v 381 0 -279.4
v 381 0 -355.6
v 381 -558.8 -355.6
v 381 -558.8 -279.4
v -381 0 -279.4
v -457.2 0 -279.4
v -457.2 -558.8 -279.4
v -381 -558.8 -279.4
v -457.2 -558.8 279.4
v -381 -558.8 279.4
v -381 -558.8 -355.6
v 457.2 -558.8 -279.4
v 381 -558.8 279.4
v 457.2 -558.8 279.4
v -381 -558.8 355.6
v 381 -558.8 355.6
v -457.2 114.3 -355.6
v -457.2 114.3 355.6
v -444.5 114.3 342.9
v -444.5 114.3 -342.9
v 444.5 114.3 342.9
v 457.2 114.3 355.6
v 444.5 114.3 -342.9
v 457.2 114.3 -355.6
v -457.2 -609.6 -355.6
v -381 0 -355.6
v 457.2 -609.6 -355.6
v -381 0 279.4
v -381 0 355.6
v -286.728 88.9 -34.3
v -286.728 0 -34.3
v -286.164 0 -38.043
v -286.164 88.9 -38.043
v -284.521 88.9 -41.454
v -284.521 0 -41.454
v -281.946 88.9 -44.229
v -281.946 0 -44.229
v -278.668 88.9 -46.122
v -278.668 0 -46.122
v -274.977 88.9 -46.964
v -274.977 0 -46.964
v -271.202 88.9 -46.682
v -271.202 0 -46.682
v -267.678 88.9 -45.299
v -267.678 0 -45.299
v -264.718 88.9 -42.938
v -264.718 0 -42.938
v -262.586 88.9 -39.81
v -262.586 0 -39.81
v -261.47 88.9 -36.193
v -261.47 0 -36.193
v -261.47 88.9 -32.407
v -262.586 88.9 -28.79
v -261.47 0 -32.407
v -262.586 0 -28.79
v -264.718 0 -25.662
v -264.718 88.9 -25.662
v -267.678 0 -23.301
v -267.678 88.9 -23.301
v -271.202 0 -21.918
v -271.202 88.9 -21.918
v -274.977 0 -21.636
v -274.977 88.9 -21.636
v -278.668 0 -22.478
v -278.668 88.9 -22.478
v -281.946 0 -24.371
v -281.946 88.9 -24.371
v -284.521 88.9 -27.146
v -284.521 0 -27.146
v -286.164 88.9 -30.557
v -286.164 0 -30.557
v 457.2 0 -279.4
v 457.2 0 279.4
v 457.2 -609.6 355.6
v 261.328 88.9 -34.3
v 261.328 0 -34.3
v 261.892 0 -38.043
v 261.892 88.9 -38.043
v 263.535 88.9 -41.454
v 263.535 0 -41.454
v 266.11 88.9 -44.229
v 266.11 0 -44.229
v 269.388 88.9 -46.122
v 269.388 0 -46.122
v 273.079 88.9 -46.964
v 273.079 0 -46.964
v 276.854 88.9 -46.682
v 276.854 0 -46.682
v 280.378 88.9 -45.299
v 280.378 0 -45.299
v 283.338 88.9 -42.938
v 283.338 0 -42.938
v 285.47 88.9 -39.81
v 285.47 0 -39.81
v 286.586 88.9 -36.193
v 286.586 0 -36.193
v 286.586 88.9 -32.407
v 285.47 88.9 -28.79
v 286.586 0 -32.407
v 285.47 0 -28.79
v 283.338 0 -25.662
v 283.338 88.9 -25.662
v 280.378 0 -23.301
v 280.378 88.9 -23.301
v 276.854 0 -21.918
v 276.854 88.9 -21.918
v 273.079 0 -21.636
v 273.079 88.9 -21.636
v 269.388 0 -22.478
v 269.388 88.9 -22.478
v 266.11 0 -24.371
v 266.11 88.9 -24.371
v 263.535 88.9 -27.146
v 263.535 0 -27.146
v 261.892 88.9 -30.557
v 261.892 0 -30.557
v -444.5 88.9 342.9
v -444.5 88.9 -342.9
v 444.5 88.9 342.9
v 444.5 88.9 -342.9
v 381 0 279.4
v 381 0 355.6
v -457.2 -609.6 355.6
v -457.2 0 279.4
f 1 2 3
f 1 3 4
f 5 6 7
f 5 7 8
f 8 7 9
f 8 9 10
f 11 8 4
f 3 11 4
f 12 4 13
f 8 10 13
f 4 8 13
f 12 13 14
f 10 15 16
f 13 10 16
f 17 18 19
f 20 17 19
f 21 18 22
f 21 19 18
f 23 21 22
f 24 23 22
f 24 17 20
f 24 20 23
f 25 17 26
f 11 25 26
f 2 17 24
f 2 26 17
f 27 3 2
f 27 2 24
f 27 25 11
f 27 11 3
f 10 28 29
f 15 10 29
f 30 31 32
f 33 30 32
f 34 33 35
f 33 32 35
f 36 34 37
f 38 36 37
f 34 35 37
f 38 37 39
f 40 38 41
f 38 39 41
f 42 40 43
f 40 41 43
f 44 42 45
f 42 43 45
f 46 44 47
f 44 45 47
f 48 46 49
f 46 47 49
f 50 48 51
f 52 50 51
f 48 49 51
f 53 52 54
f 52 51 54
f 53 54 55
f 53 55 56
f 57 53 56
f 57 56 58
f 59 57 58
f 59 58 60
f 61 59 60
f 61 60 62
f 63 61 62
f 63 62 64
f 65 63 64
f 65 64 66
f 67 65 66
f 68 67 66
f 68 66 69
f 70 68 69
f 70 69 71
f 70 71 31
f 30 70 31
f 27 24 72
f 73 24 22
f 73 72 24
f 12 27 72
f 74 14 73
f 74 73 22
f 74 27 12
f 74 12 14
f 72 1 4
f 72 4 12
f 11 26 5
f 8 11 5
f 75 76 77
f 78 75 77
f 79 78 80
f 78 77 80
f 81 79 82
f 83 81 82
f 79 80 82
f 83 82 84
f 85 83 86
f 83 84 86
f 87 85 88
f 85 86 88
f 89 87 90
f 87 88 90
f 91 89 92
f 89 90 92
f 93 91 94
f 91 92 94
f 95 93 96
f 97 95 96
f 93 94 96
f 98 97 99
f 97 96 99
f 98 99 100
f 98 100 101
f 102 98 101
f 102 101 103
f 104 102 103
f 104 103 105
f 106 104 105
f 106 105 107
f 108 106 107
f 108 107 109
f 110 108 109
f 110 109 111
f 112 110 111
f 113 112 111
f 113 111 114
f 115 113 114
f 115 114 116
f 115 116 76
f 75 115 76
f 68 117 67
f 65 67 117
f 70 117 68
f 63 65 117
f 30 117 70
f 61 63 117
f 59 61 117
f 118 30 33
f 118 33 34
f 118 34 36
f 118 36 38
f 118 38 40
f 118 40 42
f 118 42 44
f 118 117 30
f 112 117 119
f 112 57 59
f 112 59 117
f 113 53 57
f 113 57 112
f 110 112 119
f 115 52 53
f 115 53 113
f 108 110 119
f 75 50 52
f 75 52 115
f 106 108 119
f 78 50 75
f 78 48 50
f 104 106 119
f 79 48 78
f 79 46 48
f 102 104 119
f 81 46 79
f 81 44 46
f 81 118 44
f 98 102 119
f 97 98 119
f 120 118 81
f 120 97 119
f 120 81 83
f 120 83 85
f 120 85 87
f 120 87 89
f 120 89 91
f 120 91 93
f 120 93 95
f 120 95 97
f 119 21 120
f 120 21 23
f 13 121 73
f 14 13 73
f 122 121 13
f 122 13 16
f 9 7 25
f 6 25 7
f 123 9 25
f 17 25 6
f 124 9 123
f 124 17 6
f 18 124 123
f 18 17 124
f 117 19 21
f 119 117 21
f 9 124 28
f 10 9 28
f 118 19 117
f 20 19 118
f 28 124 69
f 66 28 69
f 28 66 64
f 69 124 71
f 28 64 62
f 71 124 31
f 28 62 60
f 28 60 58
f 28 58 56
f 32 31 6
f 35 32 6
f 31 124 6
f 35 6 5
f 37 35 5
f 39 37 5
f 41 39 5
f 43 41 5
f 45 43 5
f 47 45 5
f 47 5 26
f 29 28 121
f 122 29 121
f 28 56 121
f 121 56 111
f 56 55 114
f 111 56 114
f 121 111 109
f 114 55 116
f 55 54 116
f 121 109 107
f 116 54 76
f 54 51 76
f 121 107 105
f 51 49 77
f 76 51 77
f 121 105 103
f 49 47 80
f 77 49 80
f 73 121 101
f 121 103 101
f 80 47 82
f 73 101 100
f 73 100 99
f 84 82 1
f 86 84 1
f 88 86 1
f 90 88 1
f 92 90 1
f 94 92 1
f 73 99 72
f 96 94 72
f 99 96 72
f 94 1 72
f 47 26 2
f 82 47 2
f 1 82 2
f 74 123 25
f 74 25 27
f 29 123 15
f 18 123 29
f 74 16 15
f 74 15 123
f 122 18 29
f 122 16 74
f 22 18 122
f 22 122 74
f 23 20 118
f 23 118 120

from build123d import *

# Parameters (mm, degrees)
SKETCH1_W                  = 914.4
SKETCH1_H                  = 711.2
BOSS_EXTRUDE1_DEPTH        = 114.3
SKETCH2_W                  = 889
SKETCH2_H                  = 685.8
CUT_EXTRUDE1_DEPTH         = 25.4
SKETCH3_W                  = 76.2
SKETCH3_H                  = 76.2
BOSS_EXTRUDE2_DEPTH        = 609.6
SKETCH4_W                  = 914.4
SKETCH4_H                  = 711.2
BOSS_EXTRUDE3_DEPTH        = 50.8
F_1_1_DIAMETER_HOLE1_D     = 25.4
F_1_1_DIAMETER_HOLE1_DEPTH = 88.9


with BuildPart() as part:
    # Sketch1 → Boss-Extrude1 (new body)
    with BuildSketch(Plane(origin=(0, 0, 0), x_dir=(1, 0, 0), z_dir=(0, 1, 0))):
        Rectangle(SKETCH1_W, SKETCH1_H)
    extrude(amount=BOSS_EXTRUDE1_DEPTH)

    # Sketch2 → Cut-Extrude1 (cut)
    with BuildSketch(Plane(origin=(0, 114.3, 0), x_dir=(1, 0, 0), z_dir=(0, 1, 0))):
        Rectangle(SKETCH2_W, SKETCH2_H)
    extrude(amount=-CUT_EXTRUDE1_DEPTH, mode=Mode.SUBTRACT)

    # Sketch3 → Boss-Extrude2 (add)
    with BuildSketch(Plane.XZ):
        with Locations((-419.1, 317.5)):
            Rectangle(SKETCH3_W, SKETCH3_H)
        with Locations((419.1, 317.5)):
            Rectangle(SKETCH3_W, SKETCH3_H)
        with Locations((419.1, -317.5)):
            Rectangle(SKETCH3_W, SKETCH3_H)
        with Locations((-419.1, -317.5)):
            Rectangle(SKETCH3_W, SKETCH3_H)
    extrude(amount=BOSS_EXTRUDE2_DEPTH)

    # Sketch4 → Boss-Extrude3 (add)
    with BuildSketch(Plane.XZ.offset(609.6)):
        Rectangle(SKETCH4_W, SKETCH4_H)
    extrude(amount=-BOSS_EXTRUDE3_DEPTH)

    # 1 (1) Diameter Hole1
    with Locations(Plane(origin=(0, 88.9, 0), x_dir=(1, 0, 0), z_dir=(0, 1, 0))):
        with Locations((-274.028125044, 34.29999998), (274.028125044, 34.29999998)):
            Hole(F_1_1_DIAMETER_HOLE1_D / 2, depth=F_1_1_DIAMETER_HOLE1_DEPTH)


solid = part.part
